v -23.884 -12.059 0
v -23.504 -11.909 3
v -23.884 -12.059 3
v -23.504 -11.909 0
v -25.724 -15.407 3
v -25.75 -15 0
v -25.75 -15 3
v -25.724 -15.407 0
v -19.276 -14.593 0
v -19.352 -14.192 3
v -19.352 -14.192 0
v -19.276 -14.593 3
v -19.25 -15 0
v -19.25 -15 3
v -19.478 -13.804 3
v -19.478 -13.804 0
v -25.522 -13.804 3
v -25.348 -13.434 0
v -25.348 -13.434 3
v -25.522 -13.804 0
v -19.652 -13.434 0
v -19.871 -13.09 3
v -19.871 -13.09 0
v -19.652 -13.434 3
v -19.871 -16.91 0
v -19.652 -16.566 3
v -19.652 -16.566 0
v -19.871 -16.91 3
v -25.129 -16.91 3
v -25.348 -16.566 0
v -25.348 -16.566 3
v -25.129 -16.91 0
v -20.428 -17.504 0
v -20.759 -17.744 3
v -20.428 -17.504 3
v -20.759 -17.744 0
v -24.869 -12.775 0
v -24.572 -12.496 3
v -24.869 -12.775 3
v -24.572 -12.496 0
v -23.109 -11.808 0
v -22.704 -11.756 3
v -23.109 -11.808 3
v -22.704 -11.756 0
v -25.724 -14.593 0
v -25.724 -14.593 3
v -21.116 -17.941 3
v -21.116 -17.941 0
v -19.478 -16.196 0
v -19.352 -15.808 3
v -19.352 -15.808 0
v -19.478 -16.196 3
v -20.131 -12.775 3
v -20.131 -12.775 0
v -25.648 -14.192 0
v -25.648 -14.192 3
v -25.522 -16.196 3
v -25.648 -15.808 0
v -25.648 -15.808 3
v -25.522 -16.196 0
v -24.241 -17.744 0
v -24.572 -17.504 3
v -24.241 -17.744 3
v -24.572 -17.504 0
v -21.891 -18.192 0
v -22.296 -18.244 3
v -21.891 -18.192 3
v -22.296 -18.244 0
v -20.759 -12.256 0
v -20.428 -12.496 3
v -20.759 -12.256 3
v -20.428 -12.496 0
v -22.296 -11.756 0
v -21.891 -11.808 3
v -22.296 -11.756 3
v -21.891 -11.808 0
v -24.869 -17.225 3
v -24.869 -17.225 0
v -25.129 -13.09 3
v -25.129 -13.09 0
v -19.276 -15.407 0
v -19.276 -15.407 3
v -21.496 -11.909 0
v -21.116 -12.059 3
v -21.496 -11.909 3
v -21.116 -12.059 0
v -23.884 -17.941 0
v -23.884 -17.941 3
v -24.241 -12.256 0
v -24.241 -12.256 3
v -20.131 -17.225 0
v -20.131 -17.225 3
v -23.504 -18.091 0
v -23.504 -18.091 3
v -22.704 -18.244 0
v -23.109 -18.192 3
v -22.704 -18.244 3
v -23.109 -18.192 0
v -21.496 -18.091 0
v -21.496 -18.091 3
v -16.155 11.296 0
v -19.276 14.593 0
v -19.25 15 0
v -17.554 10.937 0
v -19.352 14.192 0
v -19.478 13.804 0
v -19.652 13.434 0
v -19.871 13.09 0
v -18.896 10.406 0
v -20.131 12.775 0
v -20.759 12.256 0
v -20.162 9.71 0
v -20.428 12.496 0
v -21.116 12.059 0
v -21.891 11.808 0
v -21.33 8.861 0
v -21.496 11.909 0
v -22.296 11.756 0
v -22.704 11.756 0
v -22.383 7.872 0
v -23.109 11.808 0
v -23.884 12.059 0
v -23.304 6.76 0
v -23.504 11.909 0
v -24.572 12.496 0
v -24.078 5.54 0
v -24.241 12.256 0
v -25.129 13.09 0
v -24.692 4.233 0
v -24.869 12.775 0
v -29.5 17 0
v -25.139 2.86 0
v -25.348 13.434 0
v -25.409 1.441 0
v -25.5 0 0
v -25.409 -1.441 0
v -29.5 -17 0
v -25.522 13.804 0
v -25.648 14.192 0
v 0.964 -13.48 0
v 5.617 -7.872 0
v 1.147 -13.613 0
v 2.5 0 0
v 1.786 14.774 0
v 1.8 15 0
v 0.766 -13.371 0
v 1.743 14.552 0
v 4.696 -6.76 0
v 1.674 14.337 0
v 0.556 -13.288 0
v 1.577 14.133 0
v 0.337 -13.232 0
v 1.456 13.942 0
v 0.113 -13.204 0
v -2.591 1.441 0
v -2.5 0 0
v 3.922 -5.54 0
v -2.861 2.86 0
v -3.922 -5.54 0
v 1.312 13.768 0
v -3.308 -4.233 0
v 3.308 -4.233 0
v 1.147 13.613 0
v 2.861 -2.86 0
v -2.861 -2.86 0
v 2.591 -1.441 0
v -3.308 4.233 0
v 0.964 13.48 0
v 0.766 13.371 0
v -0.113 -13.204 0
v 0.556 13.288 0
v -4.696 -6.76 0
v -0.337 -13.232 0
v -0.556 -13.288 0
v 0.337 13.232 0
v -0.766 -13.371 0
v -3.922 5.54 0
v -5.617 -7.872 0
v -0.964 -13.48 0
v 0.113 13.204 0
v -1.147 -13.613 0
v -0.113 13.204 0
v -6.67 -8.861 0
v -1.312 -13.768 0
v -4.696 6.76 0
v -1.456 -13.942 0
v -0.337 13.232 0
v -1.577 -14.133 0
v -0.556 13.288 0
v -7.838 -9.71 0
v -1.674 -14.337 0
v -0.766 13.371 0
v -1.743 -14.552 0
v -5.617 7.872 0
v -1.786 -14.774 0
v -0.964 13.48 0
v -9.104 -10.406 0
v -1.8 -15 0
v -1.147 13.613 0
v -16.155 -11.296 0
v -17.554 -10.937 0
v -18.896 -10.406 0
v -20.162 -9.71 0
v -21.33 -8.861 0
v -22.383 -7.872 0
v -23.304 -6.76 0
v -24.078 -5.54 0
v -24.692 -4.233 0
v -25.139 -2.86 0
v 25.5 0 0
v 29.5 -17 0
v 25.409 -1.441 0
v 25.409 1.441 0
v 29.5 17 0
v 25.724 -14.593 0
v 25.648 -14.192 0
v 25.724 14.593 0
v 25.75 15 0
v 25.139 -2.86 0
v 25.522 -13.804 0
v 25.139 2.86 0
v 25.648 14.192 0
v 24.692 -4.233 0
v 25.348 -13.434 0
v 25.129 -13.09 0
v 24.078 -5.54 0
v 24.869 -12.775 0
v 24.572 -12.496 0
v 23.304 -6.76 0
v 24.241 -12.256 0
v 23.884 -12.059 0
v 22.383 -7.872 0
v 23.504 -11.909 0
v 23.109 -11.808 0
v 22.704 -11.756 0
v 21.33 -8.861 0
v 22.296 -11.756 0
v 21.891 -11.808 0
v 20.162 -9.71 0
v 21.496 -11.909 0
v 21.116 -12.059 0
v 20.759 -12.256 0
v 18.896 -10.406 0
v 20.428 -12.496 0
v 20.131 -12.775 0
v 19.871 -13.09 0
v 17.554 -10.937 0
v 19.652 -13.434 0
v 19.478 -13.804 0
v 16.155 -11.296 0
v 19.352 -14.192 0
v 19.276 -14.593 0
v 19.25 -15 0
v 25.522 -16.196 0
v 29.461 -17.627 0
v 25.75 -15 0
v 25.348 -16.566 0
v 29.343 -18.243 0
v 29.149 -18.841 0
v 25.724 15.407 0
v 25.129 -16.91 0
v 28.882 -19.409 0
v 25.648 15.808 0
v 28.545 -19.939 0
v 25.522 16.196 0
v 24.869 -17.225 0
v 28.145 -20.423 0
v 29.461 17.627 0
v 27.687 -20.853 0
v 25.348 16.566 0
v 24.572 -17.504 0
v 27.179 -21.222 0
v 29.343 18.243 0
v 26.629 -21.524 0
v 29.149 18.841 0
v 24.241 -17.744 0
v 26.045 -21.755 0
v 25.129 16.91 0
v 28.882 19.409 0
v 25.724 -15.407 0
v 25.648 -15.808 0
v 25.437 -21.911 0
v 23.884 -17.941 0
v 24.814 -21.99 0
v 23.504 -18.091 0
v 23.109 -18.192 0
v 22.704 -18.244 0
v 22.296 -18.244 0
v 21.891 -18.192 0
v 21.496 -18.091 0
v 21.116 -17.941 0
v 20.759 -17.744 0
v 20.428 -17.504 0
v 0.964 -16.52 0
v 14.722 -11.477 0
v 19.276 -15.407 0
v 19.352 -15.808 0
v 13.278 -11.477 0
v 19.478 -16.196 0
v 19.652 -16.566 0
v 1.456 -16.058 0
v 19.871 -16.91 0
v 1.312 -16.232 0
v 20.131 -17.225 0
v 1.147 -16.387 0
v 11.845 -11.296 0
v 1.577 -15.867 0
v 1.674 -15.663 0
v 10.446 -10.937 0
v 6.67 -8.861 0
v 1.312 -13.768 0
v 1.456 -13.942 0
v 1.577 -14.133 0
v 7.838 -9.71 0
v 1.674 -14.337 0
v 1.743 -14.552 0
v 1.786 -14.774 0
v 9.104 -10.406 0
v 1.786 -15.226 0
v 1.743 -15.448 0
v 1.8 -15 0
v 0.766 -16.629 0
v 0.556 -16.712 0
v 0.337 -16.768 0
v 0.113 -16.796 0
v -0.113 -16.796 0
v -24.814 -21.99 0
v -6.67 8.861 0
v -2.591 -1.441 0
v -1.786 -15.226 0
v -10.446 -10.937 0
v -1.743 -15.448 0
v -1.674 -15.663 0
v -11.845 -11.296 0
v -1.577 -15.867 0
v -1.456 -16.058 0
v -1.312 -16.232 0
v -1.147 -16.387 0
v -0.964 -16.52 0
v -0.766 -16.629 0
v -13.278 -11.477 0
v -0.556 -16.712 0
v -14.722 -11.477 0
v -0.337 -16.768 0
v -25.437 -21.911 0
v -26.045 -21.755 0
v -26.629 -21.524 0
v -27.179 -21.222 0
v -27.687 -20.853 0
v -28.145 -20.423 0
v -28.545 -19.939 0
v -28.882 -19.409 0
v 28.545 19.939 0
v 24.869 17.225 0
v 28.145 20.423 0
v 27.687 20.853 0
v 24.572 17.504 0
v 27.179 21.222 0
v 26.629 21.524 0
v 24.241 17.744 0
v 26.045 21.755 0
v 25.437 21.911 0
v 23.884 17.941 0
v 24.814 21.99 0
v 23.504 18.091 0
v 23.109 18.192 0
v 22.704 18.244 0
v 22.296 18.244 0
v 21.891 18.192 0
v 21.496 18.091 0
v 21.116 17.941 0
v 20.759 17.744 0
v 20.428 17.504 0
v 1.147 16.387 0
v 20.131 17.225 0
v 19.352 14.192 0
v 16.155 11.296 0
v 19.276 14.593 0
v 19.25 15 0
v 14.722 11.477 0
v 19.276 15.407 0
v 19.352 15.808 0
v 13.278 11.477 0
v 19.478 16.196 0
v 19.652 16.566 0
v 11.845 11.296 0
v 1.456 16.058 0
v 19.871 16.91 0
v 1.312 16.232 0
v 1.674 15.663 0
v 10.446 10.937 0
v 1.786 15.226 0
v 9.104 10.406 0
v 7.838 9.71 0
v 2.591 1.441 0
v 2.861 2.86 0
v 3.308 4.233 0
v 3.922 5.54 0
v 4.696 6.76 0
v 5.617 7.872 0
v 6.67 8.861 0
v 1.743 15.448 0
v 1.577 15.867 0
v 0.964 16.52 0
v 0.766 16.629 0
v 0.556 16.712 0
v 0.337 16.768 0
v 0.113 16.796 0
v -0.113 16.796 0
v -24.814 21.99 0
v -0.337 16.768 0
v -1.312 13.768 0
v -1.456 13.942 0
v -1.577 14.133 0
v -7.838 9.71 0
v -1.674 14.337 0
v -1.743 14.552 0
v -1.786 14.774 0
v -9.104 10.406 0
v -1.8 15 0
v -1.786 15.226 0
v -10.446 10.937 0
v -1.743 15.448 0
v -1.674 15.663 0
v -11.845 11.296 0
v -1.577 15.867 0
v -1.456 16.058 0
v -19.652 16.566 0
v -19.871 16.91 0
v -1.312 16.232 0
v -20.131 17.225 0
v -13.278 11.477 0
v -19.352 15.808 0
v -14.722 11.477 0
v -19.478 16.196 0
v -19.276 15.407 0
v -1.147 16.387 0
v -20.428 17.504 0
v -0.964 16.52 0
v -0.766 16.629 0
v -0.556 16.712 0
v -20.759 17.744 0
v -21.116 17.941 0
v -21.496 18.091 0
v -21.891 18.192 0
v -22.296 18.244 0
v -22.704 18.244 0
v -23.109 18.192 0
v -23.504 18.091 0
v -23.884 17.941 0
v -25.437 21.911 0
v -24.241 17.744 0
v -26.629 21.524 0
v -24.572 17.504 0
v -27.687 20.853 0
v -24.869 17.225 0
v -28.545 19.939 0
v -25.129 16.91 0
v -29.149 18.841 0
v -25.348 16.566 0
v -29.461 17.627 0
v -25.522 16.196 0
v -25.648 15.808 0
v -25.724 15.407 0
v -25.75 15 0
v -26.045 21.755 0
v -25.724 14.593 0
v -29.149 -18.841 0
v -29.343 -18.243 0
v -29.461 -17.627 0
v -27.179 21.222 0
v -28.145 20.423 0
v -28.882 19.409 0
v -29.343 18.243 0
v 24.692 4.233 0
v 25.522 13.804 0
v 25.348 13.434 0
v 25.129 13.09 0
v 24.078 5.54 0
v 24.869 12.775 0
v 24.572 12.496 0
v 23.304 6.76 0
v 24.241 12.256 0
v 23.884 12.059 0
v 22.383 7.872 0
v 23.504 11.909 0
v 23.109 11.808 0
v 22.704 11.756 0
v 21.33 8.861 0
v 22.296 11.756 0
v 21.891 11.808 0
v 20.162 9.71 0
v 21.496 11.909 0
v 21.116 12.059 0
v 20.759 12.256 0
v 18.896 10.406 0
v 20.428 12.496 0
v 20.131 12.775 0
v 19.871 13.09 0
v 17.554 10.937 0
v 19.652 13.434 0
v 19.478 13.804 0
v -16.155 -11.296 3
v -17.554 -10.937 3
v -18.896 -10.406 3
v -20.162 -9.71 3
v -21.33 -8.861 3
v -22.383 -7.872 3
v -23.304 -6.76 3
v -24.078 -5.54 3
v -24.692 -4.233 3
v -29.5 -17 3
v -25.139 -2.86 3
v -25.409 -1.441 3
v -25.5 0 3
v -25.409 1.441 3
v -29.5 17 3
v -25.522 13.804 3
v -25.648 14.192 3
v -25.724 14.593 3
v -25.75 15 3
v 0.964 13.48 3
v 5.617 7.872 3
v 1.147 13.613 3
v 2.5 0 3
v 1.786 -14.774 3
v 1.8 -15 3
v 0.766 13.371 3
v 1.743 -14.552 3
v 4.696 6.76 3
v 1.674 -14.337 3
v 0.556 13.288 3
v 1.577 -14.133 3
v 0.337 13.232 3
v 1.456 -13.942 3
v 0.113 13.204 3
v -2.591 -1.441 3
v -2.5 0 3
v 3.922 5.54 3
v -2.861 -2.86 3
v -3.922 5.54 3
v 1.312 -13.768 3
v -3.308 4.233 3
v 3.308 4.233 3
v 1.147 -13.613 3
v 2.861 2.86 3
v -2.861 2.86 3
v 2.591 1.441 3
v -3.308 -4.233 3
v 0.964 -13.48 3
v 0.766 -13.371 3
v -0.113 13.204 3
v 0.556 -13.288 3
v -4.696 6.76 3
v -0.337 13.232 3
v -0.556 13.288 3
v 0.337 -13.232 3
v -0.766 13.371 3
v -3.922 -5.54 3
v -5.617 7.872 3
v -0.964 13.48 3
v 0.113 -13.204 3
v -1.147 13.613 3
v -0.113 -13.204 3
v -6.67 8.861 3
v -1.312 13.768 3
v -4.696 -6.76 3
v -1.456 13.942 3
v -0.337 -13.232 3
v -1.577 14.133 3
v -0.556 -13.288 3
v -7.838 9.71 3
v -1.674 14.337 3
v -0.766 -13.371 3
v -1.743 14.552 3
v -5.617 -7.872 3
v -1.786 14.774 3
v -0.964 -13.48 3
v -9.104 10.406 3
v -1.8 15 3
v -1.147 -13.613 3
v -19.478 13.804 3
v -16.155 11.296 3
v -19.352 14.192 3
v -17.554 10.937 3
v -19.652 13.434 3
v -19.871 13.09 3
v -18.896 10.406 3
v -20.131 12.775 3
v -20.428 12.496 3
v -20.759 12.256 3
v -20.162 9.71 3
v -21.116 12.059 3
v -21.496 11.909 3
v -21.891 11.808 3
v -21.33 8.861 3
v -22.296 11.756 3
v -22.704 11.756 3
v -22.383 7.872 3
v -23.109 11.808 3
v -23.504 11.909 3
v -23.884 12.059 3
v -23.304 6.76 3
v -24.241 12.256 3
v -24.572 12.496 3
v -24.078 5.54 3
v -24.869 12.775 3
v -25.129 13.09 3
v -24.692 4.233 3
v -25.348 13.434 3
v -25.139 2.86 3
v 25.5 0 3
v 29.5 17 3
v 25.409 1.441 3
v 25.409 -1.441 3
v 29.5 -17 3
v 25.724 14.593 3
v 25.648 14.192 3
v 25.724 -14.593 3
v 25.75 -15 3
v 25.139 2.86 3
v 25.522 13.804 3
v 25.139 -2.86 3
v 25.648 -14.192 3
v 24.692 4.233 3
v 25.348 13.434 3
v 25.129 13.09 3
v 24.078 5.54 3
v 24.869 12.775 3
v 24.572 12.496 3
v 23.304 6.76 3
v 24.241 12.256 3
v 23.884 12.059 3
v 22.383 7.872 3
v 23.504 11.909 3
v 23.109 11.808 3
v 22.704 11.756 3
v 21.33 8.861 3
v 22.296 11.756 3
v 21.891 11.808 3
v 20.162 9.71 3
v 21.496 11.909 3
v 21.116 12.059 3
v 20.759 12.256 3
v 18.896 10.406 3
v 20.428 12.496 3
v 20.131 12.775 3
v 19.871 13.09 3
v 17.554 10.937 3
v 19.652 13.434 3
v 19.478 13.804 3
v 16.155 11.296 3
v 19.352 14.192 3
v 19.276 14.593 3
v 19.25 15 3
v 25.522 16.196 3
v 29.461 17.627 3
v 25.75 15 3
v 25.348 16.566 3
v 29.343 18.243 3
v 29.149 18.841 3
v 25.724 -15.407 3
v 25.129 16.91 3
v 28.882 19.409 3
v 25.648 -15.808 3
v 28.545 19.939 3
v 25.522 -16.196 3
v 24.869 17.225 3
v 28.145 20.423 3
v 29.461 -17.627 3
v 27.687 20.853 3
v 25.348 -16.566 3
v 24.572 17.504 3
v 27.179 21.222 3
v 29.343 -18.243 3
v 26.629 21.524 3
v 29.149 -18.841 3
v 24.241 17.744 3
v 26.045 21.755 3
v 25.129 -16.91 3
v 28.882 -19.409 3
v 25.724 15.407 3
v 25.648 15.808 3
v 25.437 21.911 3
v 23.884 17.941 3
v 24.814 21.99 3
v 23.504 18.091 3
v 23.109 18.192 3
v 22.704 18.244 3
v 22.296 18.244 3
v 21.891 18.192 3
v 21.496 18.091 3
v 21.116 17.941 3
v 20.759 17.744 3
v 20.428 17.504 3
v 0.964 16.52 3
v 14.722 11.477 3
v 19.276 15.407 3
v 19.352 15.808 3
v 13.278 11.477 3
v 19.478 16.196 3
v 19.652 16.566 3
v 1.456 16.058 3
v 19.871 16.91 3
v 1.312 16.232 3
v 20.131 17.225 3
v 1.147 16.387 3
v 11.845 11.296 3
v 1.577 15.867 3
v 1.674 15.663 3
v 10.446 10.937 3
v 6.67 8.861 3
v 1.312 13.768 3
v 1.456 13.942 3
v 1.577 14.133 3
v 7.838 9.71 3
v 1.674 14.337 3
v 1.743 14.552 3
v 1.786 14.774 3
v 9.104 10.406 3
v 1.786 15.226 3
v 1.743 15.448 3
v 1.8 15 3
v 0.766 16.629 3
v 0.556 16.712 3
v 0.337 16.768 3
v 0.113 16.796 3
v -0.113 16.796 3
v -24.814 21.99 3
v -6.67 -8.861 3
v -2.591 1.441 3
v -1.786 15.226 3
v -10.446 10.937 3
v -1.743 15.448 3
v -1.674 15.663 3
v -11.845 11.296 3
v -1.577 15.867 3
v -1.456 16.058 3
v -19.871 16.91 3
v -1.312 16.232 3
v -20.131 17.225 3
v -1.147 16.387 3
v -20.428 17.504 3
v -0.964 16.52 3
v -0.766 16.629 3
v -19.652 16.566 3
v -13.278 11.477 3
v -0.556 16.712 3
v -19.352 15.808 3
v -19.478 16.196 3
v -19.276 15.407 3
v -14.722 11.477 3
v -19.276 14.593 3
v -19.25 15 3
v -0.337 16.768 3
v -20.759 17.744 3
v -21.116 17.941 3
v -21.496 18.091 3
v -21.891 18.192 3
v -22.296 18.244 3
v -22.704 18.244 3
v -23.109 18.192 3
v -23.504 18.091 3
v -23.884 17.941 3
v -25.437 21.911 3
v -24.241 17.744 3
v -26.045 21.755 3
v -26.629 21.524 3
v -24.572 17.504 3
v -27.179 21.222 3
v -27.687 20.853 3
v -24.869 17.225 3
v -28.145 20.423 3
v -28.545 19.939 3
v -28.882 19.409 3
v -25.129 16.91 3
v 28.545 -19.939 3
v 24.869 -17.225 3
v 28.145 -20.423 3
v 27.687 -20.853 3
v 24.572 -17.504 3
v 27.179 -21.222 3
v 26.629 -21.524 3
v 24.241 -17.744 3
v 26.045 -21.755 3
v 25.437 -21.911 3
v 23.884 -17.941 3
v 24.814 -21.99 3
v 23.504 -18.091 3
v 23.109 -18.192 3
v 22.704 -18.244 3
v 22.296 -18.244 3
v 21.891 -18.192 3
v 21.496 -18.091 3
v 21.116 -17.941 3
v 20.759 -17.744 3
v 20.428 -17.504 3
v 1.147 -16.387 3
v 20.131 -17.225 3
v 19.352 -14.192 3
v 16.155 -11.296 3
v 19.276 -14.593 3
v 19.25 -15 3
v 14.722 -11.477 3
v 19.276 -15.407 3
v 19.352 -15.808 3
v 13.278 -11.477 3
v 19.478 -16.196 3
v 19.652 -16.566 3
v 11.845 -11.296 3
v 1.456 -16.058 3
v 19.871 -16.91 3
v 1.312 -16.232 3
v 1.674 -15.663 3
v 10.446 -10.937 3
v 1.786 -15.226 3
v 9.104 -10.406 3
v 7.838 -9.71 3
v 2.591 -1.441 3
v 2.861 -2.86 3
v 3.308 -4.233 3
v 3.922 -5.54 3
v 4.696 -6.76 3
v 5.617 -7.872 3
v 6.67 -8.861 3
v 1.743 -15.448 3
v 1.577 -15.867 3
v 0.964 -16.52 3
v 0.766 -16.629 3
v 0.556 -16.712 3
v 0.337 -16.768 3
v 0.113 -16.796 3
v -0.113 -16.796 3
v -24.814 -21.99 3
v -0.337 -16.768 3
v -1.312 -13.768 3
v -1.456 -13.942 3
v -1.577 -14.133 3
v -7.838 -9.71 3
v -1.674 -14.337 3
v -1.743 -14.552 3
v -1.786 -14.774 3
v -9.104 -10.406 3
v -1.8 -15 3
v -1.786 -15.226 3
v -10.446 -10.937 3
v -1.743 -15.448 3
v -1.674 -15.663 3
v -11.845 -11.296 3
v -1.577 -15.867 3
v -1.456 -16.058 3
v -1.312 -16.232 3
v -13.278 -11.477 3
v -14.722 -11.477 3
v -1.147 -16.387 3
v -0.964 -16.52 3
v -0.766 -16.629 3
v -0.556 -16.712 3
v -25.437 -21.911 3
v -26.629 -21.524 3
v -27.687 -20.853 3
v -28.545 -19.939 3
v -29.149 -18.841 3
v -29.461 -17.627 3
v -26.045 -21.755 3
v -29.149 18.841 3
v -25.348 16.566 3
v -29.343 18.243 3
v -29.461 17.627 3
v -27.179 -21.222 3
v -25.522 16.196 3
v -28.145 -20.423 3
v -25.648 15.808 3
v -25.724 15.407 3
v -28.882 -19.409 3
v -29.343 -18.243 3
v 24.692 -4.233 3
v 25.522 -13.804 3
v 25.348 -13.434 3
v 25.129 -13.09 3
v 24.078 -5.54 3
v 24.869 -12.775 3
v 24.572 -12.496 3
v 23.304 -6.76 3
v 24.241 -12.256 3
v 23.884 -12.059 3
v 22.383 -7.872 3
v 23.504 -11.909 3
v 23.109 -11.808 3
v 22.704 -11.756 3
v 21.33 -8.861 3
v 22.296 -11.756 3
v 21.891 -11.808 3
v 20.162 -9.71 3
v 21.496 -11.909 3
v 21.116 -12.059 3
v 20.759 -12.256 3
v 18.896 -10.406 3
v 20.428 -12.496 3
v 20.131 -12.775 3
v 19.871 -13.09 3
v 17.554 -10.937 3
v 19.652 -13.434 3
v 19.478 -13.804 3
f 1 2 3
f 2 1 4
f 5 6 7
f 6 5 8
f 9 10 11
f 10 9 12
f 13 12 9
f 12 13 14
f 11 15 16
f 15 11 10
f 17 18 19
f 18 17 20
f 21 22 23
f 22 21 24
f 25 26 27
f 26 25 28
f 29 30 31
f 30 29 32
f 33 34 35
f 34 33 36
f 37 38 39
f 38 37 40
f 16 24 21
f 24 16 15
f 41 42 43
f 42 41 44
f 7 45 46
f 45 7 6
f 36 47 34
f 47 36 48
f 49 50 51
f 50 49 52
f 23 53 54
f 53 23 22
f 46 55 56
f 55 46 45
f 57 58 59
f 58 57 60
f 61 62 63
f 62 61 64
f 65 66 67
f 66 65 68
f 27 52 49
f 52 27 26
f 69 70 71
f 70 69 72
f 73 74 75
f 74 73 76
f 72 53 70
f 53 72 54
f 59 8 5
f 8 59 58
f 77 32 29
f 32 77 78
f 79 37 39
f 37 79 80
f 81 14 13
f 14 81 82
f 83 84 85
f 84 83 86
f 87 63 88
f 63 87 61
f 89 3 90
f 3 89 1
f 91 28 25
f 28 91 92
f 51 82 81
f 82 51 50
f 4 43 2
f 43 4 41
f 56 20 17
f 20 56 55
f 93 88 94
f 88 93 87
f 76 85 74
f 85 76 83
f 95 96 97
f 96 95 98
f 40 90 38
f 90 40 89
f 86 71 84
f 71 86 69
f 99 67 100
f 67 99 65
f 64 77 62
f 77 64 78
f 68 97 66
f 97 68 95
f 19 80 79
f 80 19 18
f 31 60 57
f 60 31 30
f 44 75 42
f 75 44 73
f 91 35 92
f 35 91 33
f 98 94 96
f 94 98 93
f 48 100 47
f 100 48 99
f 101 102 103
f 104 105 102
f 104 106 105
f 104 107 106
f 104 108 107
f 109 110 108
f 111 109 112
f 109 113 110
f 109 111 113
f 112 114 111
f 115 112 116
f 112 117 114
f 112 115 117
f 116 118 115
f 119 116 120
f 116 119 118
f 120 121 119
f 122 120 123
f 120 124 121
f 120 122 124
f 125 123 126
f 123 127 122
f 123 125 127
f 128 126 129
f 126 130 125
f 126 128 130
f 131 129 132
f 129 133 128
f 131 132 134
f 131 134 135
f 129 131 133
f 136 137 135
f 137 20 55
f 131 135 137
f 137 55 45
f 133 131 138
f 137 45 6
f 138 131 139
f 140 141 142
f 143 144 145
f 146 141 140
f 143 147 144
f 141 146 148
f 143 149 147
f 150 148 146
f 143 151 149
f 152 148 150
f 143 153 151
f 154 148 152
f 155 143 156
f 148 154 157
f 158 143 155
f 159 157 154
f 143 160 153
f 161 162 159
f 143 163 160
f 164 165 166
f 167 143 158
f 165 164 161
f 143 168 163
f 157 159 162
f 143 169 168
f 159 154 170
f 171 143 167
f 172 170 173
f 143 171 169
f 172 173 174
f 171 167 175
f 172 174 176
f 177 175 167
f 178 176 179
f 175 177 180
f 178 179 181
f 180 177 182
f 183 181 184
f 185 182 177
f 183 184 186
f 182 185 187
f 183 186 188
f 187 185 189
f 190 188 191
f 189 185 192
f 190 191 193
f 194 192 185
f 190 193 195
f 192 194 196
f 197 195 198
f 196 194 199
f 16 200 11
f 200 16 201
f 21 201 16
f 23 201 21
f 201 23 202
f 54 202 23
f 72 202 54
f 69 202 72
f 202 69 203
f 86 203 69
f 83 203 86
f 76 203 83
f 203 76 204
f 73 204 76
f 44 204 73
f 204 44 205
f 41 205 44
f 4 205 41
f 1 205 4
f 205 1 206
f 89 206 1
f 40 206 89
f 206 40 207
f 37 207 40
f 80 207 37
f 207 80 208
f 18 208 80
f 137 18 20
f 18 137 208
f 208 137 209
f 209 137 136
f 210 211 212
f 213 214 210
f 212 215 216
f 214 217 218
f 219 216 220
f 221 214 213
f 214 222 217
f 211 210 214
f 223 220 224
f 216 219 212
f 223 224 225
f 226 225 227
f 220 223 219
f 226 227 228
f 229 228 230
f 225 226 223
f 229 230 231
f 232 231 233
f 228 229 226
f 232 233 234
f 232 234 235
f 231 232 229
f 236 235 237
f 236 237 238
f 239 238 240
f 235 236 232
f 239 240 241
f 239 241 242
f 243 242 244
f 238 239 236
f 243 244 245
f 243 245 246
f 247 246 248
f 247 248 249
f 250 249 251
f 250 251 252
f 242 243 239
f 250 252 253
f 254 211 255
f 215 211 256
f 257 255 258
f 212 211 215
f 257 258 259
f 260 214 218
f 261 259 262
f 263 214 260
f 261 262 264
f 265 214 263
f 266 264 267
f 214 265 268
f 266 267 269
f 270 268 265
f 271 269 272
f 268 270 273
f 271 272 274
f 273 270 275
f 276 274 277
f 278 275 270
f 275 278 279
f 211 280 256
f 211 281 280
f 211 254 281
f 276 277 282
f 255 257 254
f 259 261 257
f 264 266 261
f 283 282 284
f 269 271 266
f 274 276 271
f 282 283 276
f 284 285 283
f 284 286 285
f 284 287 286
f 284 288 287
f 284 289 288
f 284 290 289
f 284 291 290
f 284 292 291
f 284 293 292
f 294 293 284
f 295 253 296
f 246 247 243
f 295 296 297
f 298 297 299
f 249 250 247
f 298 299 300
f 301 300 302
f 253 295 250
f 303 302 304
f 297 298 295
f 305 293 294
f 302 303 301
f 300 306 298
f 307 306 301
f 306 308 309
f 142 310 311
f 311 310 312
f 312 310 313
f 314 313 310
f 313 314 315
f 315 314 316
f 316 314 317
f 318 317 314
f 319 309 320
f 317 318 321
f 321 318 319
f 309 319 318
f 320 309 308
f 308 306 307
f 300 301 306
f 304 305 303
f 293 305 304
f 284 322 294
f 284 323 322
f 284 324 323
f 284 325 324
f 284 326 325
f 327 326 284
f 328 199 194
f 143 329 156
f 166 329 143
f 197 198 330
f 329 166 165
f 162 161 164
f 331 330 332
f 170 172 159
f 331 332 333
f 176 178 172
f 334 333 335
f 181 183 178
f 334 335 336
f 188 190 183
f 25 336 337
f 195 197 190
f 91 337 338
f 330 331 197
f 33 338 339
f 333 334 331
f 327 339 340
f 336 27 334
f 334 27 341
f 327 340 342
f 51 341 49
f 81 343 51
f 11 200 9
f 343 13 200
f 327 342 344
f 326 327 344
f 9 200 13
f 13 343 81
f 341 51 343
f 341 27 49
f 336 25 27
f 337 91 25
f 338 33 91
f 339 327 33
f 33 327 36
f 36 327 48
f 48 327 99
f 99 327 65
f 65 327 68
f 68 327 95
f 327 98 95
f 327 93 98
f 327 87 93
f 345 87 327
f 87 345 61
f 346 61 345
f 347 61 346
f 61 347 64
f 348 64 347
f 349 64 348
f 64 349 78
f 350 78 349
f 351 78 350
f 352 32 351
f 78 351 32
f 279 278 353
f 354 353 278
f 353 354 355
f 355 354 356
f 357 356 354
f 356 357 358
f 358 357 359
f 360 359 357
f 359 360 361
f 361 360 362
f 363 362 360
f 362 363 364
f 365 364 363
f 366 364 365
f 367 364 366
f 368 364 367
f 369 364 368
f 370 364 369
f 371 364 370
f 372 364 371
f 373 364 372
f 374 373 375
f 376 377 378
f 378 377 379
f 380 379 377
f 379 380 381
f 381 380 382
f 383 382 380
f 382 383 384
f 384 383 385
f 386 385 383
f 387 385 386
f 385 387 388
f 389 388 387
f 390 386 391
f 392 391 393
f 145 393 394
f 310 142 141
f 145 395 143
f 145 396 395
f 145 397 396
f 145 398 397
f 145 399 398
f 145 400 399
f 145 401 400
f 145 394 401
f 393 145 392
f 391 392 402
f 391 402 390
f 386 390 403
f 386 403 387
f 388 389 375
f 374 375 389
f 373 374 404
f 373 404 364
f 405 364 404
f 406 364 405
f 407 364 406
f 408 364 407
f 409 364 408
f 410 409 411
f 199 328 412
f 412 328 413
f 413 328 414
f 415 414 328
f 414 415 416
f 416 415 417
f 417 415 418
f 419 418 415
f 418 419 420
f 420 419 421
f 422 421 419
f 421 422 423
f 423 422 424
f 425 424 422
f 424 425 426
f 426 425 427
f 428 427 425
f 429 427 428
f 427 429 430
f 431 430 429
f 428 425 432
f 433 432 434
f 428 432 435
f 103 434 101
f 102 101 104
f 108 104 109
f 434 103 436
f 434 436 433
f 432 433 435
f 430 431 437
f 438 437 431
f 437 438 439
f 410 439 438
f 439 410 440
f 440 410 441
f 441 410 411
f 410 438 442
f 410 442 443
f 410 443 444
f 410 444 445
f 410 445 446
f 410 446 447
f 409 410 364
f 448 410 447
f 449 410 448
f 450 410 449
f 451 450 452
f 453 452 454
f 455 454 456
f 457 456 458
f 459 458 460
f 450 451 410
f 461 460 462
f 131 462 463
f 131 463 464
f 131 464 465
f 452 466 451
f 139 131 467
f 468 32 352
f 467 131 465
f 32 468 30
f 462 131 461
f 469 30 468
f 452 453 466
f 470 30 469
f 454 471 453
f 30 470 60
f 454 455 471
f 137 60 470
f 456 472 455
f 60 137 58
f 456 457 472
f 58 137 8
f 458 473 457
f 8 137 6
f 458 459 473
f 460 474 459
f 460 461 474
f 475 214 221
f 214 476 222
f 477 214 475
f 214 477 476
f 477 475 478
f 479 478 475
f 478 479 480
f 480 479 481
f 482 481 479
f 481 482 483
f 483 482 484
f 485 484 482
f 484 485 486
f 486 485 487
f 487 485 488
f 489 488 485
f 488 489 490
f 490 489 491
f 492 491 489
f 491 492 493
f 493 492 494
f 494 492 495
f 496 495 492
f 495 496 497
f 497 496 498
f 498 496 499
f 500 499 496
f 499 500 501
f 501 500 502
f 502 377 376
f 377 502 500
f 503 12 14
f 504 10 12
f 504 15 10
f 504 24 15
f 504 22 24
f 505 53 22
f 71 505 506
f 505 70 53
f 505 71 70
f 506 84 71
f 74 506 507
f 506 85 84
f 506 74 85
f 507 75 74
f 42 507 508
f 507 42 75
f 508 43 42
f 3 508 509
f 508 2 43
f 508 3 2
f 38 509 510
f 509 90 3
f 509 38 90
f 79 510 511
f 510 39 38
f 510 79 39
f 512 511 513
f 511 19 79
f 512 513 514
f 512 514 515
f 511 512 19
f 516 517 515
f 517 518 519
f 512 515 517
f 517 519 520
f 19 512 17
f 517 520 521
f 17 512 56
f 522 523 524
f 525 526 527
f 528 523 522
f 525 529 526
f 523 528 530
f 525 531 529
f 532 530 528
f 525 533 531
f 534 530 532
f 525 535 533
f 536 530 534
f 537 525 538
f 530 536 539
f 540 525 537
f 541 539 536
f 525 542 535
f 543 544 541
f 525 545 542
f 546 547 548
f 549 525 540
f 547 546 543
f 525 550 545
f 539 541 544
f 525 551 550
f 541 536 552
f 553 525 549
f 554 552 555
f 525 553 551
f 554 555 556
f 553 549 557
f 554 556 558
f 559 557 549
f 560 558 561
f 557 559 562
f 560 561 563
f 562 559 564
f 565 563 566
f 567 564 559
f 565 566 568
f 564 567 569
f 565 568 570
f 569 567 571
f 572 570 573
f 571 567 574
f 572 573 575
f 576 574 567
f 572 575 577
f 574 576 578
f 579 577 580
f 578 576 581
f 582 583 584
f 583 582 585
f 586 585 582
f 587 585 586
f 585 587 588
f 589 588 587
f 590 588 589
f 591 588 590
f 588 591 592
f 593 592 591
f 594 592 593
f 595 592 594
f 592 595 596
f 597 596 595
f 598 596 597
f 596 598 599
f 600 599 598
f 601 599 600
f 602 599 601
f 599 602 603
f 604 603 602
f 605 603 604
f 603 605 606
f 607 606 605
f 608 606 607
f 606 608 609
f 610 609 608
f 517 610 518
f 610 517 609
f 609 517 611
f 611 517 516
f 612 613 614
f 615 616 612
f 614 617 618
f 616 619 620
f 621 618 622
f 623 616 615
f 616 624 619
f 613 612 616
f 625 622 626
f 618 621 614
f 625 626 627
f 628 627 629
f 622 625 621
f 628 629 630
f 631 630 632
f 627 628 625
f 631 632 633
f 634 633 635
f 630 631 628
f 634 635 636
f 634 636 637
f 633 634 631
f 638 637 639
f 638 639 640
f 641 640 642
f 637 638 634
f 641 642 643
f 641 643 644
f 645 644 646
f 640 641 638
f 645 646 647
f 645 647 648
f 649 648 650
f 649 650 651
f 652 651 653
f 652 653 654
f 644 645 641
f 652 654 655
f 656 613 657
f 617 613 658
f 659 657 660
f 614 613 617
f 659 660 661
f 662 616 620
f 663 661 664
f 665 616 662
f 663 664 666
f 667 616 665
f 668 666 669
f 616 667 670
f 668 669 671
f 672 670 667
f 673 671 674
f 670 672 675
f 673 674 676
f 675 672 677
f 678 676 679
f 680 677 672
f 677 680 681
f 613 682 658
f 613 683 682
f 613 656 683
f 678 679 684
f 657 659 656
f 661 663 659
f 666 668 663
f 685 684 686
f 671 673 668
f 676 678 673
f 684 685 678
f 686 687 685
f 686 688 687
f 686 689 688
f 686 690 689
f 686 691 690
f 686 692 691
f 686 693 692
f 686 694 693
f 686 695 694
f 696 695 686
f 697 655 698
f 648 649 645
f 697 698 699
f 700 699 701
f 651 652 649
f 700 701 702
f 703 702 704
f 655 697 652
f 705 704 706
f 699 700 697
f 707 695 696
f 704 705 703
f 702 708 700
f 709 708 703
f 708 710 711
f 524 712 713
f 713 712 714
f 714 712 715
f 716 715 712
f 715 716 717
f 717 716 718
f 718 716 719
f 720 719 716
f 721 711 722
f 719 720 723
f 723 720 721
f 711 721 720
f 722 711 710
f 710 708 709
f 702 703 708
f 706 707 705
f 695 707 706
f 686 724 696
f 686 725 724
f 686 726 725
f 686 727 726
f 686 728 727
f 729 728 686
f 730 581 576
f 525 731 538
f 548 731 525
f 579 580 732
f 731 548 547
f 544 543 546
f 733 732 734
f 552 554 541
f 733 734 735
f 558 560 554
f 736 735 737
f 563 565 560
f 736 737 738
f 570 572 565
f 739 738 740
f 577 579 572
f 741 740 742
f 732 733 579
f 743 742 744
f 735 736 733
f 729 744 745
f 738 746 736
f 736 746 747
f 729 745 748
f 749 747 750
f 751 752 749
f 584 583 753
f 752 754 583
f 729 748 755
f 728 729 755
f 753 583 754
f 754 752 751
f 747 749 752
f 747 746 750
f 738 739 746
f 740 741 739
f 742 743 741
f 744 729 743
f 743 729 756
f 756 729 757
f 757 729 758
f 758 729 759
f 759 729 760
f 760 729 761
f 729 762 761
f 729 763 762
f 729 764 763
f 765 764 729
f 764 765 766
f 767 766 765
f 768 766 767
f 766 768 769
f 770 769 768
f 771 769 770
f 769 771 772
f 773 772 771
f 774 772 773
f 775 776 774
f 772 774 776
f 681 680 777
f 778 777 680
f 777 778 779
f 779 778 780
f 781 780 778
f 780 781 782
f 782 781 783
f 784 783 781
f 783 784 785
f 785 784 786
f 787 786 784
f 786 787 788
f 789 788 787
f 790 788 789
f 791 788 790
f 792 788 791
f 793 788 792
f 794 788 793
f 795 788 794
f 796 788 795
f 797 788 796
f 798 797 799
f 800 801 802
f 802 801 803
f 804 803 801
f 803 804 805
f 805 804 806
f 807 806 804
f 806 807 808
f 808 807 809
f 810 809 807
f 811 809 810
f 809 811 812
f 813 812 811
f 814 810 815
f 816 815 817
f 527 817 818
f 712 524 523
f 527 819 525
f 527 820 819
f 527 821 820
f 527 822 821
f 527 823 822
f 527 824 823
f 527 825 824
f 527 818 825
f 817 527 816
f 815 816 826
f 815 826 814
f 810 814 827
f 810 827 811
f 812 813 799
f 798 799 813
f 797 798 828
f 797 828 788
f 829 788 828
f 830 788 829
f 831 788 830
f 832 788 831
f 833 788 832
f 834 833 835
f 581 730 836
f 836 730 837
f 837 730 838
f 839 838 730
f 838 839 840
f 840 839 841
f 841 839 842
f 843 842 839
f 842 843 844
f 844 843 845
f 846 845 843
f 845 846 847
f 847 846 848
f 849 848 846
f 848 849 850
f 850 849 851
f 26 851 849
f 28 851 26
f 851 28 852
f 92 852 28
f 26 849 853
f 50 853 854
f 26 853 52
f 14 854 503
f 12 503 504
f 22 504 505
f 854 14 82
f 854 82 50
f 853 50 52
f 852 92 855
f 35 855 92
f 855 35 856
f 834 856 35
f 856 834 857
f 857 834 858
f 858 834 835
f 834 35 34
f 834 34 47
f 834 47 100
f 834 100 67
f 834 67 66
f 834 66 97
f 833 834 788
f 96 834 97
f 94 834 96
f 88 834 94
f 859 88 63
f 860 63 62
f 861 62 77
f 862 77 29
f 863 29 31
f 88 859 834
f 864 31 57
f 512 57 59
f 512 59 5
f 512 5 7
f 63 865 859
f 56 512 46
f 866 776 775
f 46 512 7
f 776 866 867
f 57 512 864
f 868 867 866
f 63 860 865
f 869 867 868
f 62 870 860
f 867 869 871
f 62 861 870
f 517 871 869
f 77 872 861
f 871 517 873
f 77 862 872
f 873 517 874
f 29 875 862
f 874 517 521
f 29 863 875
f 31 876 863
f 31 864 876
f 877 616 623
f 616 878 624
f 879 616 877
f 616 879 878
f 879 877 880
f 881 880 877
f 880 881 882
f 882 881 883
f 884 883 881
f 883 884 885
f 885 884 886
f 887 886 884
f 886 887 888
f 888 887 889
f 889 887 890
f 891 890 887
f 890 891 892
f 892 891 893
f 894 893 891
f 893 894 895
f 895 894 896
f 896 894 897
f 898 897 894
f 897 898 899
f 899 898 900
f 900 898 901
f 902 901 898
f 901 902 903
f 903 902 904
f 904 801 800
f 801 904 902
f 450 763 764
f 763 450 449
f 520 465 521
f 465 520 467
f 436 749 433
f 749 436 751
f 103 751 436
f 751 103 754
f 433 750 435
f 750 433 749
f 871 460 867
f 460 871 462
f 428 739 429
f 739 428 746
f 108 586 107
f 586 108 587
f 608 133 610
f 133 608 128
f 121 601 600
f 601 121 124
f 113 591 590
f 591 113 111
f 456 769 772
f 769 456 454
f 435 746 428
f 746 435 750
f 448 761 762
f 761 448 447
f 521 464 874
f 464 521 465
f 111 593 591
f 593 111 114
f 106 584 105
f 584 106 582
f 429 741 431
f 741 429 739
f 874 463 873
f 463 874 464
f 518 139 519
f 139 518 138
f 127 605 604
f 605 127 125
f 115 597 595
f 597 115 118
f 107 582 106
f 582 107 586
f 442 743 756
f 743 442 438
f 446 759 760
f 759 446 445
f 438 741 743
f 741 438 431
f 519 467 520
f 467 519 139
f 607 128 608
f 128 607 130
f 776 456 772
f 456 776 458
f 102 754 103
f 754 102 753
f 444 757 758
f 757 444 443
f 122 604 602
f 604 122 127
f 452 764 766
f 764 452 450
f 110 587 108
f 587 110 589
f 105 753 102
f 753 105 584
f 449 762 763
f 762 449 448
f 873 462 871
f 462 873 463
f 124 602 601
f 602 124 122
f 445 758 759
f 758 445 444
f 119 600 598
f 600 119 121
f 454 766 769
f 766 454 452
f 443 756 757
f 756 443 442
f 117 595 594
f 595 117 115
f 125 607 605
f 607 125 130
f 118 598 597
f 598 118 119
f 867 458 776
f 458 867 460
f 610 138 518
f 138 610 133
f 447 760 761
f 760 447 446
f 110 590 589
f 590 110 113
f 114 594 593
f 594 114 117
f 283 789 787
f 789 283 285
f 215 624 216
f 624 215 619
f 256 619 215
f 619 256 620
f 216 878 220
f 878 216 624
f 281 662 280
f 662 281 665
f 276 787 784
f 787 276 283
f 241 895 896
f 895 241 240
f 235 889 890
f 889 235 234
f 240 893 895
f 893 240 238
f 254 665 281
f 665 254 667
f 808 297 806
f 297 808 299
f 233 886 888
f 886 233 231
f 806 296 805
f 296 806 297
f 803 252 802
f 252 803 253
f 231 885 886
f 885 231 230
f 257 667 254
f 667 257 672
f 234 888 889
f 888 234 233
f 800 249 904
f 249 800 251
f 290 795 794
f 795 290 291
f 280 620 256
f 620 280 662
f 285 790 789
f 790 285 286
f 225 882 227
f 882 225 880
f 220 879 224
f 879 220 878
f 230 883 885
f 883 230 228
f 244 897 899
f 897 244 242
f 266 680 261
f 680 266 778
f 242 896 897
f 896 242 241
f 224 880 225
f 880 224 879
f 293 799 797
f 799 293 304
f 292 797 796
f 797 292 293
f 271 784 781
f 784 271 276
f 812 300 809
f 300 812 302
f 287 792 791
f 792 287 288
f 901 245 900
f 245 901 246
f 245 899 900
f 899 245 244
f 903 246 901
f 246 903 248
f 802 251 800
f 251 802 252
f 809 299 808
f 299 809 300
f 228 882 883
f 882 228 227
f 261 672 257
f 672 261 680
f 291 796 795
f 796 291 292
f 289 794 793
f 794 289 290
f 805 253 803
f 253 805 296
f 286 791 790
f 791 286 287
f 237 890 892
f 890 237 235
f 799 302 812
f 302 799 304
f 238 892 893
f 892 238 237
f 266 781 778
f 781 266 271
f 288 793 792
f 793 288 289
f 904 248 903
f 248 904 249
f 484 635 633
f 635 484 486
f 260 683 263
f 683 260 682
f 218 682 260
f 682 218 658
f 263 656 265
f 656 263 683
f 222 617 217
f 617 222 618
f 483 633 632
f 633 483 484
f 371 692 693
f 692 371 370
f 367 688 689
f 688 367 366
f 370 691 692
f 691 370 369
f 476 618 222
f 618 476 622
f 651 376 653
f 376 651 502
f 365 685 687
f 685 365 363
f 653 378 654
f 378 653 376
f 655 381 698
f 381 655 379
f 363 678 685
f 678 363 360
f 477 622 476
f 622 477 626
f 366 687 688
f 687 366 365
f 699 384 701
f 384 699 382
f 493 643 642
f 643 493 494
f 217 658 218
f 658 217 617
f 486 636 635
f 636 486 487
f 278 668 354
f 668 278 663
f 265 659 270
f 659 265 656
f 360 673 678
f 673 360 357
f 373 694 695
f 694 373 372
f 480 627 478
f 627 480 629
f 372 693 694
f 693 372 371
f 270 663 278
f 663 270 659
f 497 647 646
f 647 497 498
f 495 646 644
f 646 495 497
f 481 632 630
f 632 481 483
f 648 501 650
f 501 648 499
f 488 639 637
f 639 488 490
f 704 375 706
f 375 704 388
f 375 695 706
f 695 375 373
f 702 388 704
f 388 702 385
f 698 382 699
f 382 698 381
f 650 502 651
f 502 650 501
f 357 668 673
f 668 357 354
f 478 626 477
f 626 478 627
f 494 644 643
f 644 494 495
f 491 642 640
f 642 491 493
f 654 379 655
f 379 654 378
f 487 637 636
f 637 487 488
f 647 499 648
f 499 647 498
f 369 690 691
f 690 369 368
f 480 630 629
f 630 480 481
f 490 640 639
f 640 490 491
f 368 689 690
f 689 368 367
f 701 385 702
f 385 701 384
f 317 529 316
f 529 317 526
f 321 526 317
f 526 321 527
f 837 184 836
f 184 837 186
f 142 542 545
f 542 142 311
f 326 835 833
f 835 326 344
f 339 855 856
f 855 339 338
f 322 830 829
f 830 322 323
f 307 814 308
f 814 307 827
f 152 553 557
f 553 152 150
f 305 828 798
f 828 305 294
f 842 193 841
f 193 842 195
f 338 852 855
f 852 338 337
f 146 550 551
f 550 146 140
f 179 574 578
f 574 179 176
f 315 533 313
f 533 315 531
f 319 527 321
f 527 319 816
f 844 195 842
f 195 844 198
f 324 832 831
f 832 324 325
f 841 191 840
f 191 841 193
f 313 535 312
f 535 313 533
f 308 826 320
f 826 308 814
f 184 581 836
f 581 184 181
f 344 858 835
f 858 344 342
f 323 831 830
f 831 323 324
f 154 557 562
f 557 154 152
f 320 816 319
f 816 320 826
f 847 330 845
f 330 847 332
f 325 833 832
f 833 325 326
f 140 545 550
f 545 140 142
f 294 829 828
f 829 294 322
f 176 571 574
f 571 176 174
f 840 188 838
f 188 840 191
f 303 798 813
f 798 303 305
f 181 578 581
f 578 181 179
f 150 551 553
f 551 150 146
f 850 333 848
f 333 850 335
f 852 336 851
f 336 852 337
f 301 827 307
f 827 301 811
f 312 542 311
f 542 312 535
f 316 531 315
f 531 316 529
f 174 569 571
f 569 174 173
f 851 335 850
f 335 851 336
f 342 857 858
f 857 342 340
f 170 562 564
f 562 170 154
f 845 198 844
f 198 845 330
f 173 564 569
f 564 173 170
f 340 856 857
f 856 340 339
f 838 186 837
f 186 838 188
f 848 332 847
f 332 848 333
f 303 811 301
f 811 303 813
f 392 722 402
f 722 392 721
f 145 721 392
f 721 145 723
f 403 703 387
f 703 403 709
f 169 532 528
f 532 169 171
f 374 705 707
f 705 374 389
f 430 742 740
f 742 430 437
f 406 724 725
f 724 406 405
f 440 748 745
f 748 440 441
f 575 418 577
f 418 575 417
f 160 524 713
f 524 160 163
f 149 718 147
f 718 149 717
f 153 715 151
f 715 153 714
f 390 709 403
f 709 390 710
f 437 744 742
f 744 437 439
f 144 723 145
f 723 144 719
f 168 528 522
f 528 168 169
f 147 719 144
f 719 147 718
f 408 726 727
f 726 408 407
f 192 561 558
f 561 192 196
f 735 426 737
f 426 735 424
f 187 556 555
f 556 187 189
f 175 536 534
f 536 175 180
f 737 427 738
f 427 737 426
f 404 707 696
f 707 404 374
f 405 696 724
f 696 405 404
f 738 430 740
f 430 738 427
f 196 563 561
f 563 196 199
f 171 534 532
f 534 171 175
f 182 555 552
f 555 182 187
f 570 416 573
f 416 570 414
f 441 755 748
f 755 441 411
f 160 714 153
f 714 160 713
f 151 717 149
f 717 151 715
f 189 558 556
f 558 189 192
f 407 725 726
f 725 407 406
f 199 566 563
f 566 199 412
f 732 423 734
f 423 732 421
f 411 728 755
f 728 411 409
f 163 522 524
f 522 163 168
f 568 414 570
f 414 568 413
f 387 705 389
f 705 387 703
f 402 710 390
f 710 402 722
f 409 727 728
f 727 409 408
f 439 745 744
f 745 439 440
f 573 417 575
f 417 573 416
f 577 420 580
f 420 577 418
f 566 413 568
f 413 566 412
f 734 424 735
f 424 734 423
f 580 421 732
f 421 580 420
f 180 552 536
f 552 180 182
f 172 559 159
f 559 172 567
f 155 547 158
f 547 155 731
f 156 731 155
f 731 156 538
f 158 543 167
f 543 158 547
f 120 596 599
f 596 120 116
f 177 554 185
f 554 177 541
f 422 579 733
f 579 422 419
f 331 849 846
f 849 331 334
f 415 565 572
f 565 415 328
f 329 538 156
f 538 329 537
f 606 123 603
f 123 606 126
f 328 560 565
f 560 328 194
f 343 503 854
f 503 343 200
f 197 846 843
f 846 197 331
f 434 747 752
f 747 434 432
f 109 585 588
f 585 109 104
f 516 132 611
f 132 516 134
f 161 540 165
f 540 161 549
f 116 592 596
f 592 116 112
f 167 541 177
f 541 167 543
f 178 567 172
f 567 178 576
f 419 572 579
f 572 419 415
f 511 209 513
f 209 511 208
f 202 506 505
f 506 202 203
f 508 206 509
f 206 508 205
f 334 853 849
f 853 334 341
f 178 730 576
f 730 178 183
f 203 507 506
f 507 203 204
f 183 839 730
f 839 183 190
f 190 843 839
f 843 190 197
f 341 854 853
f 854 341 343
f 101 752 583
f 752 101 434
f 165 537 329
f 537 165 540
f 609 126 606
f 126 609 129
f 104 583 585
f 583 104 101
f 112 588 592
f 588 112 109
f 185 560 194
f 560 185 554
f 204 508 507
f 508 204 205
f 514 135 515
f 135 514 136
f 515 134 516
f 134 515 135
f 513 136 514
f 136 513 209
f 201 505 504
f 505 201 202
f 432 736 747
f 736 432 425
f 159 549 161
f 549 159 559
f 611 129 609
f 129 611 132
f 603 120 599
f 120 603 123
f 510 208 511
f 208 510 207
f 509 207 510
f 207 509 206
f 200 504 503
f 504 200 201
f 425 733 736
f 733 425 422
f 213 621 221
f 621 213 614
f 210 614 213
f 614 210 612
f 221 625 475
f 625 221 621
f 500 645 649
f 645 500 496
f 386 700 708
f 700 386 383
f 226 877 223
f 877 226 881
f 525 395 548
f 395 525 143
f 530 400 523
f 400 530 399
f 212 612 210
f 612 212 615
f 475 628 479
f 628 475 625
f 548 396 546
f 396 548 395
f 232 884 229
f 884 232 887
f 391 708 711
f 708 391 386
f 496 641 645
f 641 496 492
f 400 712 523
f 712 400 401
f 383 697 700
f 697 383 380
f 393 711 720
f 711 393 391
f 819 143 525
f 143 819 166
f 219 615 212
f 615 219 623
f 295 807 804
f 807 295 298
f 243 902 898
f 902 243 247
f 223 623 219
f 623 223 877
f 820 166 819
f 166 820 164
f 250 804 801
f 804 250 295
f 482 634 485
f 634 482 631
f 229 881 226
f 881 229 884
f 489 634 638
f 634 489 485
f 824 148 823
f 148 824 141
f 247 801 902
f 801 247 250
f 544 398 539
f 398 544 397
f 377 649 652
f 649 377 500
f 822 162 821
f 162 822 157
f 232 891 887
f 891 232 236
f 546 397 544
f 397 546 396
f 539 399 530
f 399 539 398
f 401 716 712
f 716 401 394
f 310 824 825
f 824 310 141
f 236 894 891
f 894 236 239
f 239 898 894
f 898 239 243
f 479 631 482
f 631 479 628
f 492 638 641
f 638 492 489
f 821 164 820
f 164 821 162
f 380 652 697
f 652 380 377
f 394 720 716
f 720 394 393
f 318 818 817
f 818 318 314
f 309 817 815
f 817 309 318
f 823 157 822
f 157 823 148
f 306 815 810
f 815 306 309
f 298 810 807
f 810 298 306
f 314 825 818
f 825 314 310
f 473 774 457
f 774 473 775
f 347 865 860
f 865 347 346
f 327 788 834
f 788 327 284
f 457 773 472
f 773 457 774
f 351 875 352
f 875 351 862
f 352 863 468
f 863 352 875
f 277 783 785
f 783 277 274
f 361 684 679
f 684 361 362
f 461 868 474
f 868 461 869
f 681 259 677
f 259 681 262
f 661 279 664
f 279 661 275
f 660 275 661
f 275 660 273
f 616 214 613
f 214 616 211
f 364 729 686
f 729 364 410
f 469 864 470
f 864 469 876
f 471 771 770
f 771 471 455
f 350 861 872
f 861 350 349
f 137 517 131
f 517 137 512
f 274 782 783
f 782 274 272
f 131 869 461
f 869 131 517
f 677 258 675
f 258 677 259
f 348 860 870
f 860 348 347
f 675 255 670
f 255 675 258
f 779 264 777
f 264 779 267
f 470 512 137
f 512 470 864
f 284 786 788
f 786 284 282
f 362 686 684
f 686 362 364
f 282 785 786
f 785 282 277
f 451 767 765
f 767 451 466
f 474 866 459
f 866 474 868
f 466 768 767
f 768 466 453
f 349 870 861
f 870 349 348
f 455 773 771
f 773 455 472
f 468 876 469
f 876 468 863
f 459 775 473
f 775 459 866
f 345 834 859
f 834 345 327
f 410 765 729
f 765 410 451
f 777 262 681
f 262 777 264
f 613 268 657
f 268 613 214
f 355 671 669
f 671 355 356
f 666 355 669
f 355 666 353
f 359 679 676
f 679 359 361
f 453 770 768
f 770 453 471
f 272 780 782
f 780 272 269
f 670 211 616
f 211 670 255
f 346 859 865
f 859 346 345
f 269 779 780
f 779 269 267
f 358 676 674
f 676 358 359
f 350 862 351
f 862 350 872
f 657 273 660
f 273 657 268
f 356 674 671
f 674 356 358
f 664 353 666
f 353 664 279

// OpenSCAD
$fn = 50;

difference() {
	union() {
		hull() {
			translate(v = [-24.5, 17.0, 0]) {
				cylinder(h = 3, r = 5);
			}
			translate(v = [24.5, 17.0, 0]) {
				cylinder(h = 3, r = 5);
			}
			translate(v = [-24.5, -17.0, 0]) {
				cylinder(h = 3, r = 5);
			}
			translate(v = [24.5, -17.0, 0]) {
				cylinder(h = 3, r = 5);
			}
		}
	}
	union() {
		translate(v = [-22.5, -15.0, 0]) {
			cylinder(h = 3, r = 3.25);
		}
		translate(v = [-22.5, 15.0, 0]) {
			cylinder(h = 3, r = 3.25);
		}
		translate(v = [22.5, -15.0, 0]) {
			cylinder(h = 3, r = 3.25);
		}
		translate(v = [22.5, 15.0, 0]) {
			cylinder(h = 3, r = 3.25);
		}
		translate(v = [0.0, -15.0, 0]) {
			cylinder(h = 3, r = 1.8);
		}
		translate(v = [0.0, 15.0, 0]) {
			cylinder(h = 3, r = 1.8);
		}
		translate(v = [-14.0, 0, 0.0]) {
			cylinder(h = 3, r = 11.5);
		}
		translate(v = [14.0, 0, 0.0]) {
			cylinder(h = 3, r = 11.5);
		}
	}
}
